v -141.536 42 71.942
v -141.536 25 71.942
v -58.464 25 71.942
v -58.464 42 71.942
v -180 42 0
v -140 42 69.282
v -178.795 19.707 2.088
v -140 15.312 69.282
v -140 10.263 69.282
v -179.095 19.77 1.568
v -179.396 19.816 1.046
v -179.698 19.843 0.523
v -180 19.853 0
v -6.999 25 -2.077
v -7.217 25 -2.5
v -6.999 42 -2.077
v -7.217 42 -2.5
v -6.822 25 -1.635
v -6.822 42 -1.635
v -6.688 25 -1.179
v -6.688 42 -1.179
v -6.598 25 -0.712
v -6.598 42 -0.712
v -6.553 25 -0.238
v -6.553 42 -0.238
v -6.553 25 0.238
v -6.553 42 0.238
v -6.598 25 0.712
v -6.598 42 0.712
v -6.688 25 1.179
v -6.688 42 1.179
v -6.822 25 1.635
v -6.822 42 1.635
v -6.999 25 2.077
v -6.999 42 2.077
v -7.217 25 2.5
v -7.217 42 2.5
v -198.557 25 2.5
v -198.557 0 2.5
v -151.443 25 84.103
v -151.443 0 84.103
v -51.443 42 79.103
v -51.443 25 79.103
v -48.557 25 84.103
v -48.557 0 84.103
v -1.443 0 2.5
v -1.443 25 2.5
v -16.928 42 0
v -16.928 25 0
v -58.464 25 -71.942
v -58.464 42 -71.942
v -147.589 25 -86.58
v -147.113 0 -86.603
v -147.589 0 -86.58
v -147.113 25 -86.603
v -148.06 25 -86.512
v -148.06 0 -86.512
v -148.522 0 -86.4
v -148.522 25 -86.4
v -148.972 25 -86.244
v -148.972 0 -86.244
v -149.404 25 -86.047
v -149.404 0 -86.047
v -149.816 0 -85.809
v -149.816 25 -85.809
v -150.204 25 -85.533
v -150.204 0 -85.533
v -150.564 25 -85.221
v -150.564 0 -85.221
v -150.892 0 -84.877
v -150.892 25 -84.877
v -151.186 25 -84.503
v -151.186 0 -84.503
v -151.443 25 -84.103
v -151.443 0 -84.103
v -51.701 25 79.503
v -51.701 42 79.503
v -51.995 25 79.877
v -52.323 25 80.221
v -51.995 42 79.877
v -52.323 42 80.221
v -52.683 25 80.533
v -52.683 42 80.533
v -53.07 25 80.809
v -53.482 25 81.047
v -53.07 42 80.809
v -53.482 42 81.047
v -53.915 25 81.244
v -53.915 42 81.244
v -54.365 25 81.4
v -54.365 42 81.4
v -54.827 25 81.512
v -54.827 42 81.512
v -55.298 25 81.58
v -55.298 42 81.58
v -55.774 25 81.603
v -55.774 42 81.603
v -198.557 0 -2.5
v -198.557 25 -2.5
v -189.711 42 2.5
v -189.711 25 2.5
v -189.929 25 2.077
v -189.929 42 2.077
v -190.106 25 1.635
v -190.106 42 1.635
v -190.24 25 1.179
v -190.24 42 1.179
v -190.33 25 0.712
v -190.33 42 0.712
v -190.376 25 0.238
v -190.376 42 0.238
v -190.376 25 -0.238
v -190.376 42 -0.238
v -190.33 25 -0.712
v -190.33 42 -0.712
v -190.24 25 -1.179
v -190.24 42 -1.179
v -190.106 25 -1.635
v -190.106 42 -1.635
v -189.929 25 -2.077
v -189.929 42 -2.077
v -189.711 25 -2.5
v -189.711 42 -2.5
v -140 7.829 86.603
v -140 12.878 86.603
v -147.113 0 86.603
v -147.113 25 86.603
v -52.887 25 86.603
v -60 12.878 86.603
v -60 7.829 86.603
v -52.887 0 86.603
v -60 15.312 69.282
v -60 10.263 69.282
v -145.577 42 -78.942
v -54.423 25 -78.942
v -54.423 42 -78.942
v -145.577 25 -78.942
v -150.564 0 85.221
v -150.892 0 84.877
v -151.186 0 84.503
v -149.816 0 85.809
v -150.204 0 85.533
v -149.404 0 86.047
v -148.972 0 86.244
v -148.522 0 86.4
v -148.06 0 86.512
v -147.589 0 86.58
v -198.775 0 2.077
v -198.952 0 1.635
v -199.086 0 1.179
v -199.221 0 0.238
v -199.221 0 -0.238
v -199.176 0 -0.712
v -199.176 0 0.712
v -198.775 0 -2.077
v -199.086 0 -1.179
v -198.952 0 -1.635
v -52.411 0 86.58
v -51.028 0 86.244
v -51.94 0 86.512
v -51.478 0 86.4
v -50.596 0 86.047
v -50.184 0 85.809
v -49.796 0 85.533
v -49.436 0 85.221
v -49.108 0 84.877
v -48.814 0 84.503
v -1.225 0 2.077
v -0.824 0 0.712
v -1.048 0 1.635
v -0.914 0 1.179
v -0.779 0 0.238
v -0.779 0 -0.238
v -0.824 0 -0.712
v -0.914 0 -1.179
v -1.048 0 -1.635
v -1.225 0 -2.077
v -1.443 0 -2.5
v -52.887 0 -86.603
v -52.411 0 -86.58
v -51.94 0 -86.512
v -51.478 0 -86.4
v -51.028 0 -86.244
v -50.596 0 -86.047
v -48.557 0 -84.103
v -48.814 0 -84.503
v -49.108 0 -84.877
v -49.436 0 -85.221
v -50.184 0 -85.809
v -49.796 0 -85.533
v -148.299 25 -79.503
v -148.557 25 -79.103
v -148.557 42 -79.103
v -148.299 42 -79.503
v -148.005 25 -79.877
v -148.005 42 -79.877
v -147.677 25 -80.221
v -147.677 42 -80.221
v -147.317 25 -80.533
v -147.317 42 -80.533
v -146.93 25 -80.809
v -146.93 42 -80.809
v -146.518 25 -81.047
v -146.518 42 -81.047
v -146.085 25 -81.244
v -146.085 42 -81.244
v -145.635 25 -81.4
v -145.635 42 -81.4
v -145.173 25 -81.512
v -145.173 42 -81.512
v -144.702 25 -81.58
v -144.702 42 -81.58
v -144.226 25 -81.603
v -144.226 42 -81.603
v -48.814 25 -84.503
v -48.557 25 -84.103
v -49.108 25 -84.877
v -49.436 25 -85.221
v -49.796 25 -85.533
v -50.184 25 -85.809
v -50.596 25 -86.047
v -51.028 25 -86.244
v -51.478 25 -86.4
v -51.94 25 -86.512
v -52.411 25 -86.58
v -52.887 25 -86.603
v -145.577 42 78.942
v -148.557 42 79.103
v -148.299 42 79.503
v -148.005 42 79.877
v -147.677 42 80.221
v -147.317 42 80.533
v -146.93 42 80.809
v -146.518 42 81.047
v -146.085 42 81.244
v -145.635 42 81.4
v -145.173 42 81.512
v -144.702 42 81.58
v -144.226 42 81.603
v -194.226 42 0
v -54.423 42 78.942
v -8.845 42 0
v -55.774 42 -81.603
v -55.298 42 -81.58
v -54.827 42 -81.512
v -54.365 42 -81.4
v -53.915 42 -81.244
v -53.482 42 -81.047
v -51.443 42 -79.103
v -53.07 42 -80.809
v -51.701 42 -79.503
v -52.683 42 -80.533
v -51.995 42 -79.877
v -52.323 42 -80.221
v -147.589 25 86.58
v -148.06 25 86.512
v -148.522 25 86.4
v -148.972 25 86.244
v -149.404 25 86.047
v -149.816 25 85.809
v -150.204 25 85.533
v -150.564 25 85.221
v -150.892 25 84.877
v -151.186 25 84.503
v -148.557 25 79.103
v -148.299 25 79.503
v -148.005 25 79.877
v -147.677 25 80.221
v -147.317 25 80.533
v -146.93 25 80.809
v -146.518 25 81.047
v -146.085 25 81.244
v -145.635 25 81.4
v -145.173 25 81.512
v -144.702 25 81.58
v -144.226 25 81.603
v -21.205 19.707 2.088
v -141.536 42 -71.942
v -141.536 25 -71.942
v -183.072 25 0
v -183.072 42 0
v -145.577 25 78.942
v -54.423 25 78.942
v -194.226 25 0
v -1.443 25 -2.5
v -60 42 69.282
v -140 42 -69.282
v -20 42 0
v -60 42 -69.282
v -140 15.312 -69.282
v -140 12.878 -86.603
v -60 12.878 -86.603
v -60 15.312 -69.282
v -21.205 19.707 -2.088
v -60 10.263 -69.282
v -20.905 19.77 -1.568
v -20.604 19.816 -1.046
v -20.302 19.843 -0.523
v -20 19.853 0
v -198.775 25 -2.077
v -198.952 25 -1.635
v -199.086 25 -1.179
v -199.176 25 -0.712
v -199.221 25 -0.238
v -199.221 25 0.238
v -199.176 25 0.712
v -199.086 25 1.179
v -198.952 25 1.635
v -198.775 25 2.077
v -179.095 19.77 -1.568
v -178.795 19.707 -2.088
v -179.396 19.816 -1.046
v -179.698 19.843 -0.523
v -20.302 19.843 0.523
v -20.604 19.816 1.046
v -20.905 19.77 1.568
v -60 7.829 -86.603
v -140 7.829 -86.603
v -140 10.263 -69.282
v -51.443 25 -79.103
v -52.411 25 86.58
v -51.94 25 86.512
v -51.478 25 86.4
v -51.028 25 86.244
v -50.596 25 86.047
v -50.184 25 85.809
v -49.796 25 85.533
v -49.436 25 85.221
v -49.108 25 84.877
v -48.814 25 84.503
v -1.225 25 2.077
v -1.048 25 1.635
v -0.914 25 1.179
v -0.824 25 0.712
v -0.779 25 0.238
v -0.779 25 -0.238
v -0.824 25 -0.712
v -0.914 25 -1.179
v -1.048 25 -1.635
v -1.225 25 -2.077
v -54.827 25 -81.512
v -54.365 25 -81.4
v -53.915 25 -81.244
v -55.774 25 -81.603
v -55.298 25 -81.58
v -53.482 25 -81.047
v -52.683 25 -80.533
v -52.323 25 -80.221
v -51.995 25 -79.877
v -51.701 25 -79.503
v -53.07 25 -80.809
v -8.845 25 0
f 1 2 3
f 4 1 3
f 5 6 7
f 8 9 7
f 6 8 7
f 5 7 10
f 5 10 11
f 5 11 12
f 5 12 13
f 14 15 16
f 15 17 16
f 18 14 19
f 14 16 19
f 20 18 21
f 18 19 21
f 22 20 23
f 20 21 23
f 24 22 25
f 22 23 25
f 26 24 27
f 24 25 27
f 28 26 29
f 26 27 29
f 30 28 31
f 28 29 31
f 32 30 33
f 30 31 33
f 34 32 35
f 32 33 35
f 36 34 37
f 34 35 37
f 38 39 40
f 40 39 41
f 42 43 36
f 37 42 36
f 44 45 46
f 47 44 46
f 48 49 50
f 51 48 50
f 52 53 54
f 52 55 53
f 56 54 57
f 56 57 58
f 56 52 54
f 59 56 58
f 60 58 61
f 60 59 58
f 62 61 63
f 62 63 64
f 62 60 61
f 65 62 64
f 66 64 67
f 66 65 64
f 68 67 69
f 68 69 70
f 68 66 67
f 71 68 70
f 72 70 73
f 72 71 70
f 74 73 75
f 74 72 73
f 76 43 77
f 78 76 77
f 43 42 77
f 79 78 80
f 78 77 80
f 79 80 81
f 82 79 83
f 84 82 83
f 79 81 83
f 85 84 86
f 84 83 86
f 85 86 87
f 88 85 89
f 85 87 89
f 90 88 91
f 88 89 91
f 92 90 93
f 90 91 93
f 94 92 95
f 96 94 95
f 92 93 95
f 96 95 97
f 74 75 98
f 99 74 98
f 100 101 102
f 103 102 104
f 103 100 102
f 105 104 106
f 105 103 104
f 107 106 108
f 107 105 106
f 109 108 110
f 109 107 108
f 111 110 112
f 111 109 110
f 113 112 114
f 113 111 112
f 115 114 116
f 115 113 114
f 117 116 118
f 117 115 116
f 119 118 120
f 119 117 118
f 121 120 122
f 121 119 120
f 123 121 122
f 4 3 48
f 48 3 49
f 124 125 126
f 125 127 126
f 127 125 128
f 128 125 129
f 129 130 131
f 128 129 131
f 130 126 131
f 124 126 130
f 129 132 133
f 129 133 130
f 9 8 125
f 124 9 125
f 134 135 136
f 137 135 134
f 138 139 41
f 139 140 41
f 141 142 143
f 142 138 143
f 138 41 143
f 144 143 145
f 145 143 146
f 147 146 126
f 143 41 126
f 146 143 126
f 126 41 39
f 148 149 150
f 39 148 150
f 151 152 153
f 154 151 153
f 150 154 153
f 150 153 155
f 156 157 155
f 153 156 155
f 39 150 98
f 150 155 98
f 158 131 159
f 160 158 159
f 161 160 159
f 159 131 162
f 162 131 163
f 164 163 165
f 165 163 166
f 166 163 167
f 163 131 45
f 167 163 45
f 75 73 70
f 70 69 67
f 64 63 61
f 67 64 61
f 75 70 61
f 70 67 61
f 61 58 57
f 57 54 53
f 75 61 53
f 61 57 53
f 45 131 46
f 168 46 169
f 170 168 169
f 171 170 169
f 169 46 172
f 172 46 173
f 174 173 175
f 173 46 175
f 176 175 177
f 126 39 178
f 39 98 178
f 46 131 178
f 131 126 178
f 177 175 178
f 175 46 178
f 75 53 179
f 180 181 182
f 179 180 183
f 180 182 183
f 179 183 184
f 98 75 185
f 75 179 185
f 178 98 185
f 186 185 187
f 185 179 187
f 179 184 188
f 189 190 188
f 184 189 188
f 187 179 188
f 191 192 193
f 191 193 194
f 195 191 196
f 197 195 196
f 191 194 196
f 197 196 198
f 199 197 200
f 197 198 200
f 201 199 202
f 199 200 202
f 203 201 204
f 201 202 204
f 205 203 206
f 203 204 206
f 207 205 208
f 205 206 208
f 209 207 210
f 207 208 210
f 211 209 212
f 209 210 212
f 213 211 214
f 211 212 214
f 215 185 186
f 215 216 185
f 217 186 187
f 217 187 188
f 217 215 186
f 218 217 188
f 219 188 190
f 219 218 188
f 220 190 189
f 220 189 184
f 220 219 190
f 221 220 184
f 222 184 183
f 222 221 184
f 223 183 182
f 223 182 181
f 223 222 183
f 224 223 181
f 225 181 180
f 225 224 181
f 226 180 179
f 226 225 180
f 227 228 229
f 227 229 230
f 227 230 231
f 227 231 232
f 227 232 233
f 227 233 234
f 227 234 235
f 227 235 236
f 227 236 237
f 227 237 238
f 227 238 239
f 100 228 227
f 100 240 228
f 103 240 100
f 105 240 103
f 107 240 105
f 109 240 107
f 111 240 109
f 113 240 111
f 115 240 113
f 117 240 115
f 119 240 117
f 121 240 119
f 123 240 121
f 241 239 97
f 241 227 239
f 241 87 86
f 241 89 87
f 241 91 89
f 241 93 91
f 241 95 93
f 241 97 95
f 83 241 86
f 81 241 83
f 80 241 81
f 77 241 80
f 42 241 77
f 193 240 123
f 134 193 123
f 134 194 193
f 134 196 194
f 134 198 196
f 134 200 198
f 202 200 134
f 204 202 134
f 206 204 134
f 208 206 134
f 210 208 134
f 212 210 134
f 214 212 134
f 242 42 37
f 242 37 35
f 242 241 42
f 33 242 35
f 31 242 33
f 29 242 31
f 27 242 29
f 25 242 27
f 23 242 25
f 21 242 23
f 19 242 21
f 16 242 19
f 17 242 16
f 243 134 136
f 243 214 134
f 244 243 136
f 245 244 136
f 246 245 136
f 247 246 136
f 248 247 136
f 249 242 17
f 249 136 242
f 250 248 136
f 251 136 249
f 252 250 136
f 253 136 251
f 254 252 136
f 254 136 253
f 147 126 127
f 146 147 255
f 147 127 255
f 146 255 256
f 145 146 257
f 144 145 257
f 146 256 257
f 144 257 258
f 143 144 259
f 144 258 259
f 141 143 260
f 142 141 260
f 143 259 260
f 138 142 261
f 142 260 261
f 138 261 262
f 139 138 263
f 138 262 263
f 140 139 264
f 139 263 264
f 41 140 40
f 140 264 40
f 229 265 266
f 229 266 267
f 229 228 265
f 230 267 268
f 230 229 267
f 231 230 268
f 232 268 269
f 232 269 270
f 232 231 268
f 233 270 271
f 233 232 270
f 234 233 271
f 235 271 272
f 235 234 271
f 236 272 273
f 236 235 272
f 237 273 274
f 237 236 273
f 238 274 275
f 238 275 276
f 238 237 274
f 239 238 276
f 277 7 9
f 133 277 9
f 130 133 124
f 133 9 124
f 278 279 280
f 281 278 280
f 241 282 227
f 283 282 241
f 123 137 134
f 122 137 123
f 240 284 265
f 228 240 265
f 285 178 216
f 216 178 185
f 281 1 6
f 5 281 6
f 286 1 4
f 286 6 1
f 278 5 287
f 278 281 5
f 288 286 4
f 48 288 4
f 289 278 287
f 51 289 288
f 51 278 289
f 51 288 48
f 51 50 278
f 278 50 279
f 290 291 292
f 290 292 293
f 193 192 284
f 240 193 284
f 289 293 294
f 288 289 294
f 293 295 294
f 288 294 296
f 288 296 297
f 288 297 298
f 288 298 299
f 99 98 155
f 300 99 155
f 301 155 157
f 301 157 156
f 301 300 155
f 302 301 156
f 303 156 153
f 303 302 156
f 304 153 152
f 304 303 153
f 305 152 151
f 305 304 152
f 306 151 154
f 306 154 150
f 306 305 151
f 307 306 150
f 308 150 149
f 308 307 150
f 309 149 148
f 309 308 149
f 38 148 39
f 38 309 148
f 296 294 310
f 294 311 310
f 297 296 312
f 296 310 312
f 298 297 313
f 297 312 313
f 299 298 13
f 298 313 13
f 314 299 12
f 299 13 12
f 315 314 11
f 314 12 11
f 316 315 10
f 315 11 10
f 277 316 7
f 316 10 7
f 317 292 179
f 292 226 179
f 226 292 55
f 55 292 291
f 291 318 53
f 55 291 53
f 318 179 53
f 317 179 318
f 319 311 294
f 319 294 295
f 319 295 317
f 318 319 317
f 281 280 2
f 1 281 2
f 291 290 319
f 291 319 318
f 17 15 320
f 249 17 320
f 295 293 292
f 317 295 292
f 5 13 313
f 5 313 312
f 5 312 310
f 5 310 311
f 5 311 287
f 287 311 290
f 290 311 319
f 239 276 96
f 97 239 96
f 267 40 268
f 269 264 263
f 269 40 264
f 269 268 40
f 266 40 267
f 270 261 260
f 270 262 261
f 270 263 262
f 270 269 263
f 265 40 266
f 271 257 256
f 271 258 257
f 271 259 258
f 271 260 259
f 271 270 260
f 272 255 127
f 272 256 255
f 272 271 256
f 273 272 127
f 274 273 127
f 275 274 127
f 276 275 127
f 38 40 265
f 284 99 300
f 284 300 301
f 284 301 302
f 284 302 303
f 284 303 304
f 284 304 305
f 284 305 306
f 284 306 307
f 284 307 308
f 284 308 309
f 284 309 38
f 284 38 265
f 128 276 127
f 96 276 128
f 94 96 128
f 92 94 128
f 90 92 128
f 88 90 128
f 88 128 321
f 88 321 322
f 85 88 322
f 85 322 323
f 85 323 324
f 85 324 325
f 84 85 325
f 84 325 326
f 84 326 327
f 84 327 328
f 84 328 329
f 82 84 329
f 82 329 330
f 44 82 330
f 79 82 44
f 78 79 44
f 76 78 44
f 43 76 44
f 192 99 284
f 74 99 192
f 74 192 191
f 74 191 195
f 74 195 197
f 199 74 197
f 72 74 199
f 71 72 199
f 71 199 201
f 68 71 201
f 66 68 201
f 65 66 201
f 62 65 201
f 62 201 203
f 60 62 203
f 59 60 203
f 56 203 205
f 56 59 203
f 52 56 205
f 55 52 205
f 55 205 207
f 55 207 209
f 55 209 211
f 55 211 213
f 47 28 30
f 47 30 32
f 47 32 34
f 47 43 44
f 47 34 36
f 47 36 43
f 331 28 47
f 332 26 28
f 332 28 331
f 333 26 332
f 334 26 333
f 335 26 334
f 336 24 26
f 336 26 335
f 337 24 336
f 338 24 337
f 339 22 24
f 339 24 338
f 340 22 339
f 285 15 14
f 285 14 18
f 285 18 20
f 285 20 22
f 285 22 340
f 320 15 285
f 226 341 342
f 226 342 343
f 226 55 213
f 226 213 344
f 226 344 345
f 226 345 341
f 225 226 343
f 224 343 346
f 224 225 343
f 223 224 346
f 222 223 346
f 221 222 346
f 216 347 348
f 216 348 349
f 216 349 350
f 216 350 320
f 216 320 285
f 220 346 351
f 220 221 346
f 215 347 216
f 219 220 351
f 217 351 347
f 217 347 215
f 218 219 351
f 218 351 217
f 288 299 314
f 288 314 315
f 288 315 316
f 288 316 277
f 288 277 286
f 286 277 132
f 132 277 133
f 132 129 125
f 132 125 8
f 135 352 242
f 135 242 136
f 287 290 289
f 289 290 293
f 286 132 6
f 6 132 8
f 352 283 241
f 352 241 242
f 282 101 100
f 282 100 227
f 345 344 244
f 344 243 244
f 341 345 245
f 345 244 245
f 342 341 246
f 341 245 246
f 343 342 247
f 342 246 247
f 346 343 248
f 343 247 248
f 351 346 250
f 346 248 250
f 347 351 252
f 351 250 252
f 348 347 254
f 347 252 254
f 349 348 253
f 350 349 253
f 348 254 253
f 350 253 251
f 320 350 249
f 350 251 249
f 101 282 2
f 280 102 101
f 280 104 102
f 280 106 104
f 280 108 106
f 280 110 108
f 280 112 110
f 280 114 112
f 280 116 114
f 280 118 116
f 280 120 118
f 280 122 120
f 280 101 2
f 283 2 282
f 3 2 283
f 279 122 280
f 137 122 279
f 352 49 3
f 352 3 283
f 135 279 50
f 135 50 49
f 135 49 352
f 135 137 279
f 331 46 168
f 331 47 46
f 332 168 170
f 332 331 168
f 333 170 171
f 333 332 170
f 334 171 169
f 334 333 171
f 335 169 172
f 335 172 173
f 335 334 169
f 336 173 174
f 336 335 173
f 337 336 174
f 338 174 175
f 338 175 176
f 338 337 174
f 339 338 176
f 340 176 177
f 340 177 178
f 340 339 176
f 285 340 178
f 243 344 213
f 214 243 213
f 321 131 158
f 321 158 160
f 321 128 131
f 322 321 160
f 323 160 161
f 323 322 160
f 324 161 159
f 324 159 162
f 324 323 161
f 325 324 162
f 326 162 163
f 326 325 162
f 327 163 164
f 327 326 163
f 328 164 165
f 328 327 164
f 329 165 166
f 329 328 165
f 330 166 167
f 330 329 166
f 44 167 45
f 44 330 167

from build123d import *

# Parameters (mm, degrees)
BOSS_EXTRUDE1_DEPTH            = 25
CUT_EXTRUDE1_DEPTH             = 5
CUT_EXTRUDE7_REACH             = 136.629
CUT_EXTRUDE7_DIRECTION_2_REACH = 136.629
CUT_EXTRUDE8_REACH             = 136.629
CUT_EXTRUDE8_DIRECTION_2_REACH = 136.629
CUT_EXTRUDE9_DEPTH             = 40
CUT_EXTRUDE9_DEPTH_BACK        = 40
FILLET2_R                      = 15
BOSS_EXTRUDE5_DEPTH            = 17
FILLET3_R                      = 5


with BuildPart() as part:
    # Sketch1 → Boss-Extrude1 (new body)
    with BuildSketch(Plane(origin=(0, 0, 0), x_dir=(1, 0, 0), z_dir=(0, 1, 0))):
        Polygon((0, 0), (-50, 86.6025403784439), (-149.99999999999997, 86.60254037844393), (-199.99999999999997, 1.041e-14), (-150.00000000000003, -86.60254037844386), (-50.00000000000001, -86.60254037844389), align=None)
    extrude(amount=BOSS_EXTRUDE1_DEPTH)

    # Sketch6 → Cut-Extrude1 (cut)
    with BuildSketch(Plane(origin=(0, 25, 0), x_dir=(1, 0, 0), z_dir=(0, 1, 0))):
        Polygon((-180, 5.476e-14), (-139.99999999999997, -69.28203230275507), (-59.99999999999997, -69.28203230275508), (-20.000000000000004, 1.463e-14), (-60.000000000000014, 69.28203230275516), (-140, 69.28203230275516), align=None)
    extrude(amount=-CUT_EXTRUDE1_DEPTH, mode=Mode.SUBTRACT)

    # Cut-Extrude7: up to this plane
    cut_extrude7_end = Plane(origin=(-20.000000000000004, 20, -1.463e-14), z_dir=(0.8660254037844388, 0, -0.49999999999999983))
    # Sketch21 → Cut-Extrude7 (cut, up to the surface)
    with BuildSketch(Plane(origin=(-100, 0, 0), x_dir=(0, 0, -1), z_dir=(1, 0, 0)), mode=Mode.PRIVATE) as cut_extrude7_sk1:
        Polygon((69.28203230275516, 20), (69.28203230275516, 10.263045350293245), (3.123e-14, 20), align=None)
    cut_extrude7_tool1 = split(extrude(cut_extrude7_sk1.sketch, amount=CUT_EXTRUDE7_REACH, mode=Mode.PRIVATE), bisect_by=cut_extrude7_end, keep=Keep.BOTH, mode=Mode.PRIVATE)
    add(cut_extrude7_tool1.solids().sort_by_distance((-100, 16.754348, -46.188022))[0], mode=Mode.SUBTRACT)

    # Cut-Extrude7 direction 2: up to this plane
    cut_extrude7_direction_2_end = Plane(origin=(-140, 20, -69.28203230275516), z_dir=(-0.8660254037844388, 0, -0.4999999999999998))
    # Sketch21 → Cut-Extrude7 direction 2 (cut, up to the surface)
    with BuildSketch(Plane(origin=(-100, 0, 0), x_dir=(0, 0, -1), z_dir=(1, 0, 0)), mode=Mode.PRIVATE) as cut_extrude7_direction_2_sk1:
        Polygon((69.28203230275516, 20), (69.28203230275516, 10.263045350293245), (3.123e-14, 20), align=None)
    cut_extrude7_direction_2_tool1 = split(extrude(cut_extrude7_direction_2_sk1.sketch, amount=-CUT_EXTRUDE7_DIRECTION_2_REACH, mode=Mode.PRIVATE), bisect_by=cut_extrude7_direction_2_end, keep=Keep.BOTH, mode=Mode.PRIVATE)
    add(cut_extrude7_direction_2_tool1.solids().sort_by_distance((-100, 16.754348, -46.188022))[0], mode=Mode.SUBTRACT)

    # Cut-Extrude8: up to this plane
    cut_extrude8_end = Plane(origin=(-59.99999999999997, 20, 69.28203230275508), z_dir=(0.8660254037844388, 0, 0.49999999999999967))
    # Sketch22 → Cut-Extrude8 (cut, up to the surface)
    with BuildSketch(Plane(origin=(-100, 0, 0), x_dir=(0, 0, -1), z_dir=(1, 0, 0)), mode=Mode.PRIVATE) as cut_extrude8_sk1:
        Polygon((3.123e-14, 20), (-69.28203230275508, 10.26304535029323), (-69.28203230275508, 20), align=None)
    cut_extrude8_tool1 = split(extrude(cut_extrude8_sk1.sketch, amount=CUT_EXTRUDE8_REACH, mode=Mode.PRIVATE), bisect_by=cut_extrude8_end, keep=Keep.BOTH, mode=Mode.PRIVATE)
    add(cut_extrude8_tool1.solids().sort_by_distance((-100, 16.754348, 46.188022))[0], mode=Mode.SUBTRACT)

    # Cut-Extrude8 direction 2: up to this plane
    cut_extrude8_direction_2_end = Plane(origin=(-180, 20, -5.476e-14), z_dir=(-0.8660254037844387, 0, 0.5))
    # Sketch22 → Cut-Extrude8 direction 2 (cut, up to the surface)
    with BuildSketch(Plane(origin=(-100, 0, 0), x_dir=(0, 0, -1), z_dir=(1, 0, 0)), mode=Mode.PRIVATE) as cut_extrude8_direction_2_sk1:
        Polygon((3.123e-14, 20), (-69.28203230275508, 10.26304535029323), (-69.28203230275508, 20), align=None)
    cut_extrude8_direction_2_tool1 = split(extrude(cut_extrude8_direction_2_sk1.sketch, amount=-CUT_EXTRUDE8_DIRECTION_2_REACH, mode=Mode.PRIVATE), bisect_by=cut_extrude8_direction_2_end, keep=Keep.BOTH, mode=Mode.PRIVATE)
    add(cut_extrude8_direction_2_tool1.solids().sort_by_distance((-100, 16.754348, 46.188022))[0], mode=Mode.SUBTRACT)

    # Sketch23 → Cut-Extrude9 (cut, two sides: drawn at the far end of the back side and taken through both)
    with BuildSketch(Plane(origin=(-100, 0, 0), x_dir=(0, 0, -1), z_dir=(1, 0, 0)).offset(-CUT_EXTRUDE9_DEPTH_BACK)):
        Polygon((69.28203230275516, 10.263045350293245), (89.28203230275517, 7.452228656245558), (89.28203230275517, 12.501366518838644), (69.28203230275516, 15.312183212886326), align=None)
        Polygon((-69.28203230275516, 15.312183212886326), (-69.28203230275516, 10.263045350293245), (-89.28203230275517, 7.452228656245558), (-89.28203230275517, 12.501366518838644), align=None)
    extrude(amount=CUT_EXTRUDE9_DEPTH + CUT_EXTRUDE9_DEPTH_BACK, mode=Mode.SUBTRACT)

    # Fillet2
    fillet2_edges = [part.edges().sort_by_distance(p)[0] for p in [
        (-100, 20, -3.347e-14),
    ]]
    fillet(fillet2_edges, radius=FILLET2_R)

    # Sketch27 → Boss-Extrude5 (add)
    # profile 1 of 2: a face of its own
    with BuildSketch(Plane(origin=(0, 25, 0), x_dir=(1, 0, 0), z_dir=(0, 1, 0))):
        Polygon((-147.1132486552964, -81.60254038059946), (-52.8867513447036, -81.60254038059949), (-5.773502689407191, -2.776e-14), (-52.88675134470361, 81.60254038059944), (-147.1132486552964, 81.60254038059945), (-194.22649731059275, -2.775e-14), align=None)
        Polygon((-54.42264973081038, -78.94228634059947), (-8.845299461620776, -2.374e-14), (-54.4226497308104, 78.9422863405995), (-145.57735026918957, 78.9422863405995), (-191.1547005383792, -1.365e-14), (-145.57735026918962, -78.94228634059945), align=None, mode=Mode.SUBTRACT)
    # profile 2 of 2: a face of its own
    with BuildSketch(Plane(origin=(0, 25, 0), x_dir=(1, 0, 0), z_dir=(0, 1, 0))):
        Polygon((-141.5358983848622, -71.94228634059951), (-58.46410161513772, -71.94228634059952), (-16.92820323027549, 1.392e-14), (-58.4641016151377, 71.94228634059947), (-141.53589838486224, 71.94228634059947), (-183.0717967697245, -2.773e-14), align=None)
        Polygon((-139.99999999999997, -69.28203230275507), (-180, 6.939e-14), (-140, 69.28203230275516), (-60.000000000000014, 69.28203230275516), (-20.000000000000004, 1.463e-14), (-59.99999999999997, -69.28203230275508), align=None, mode=Mode.SUBTRACT)
    extrude(amount=BOSS_EXTRUDE5_DEPTH)

    # Fillet3
    fillet3_edges = [part.edges().sort_by_distance(p)[0] for p in [
        (-50.00000000000001, 12.5, 86.60254037844389),
        (-150.00000000000003, 12.5, 86.60254037844386),
        (-147.1132486552964, 33.5, 81.60254038059946),
        (-199.99999999999997, 12.5, -1.041e-14),
        (-52.8867513447036, 33.5, 81.60254038059949),
        (-5.773502689407191, 33.5, 2.776e-14),
        (-149.99999999999997, 12.5, -86.60254037844393),
        (-52.88675134470361, 33.5, -81.60254038059944),
        (-147.1132486552964, 33.5, -81.60254038059945),
        (-50, 12.5, -86.6025403784439),
        (0, 12.5, 0),
        (-191.1547005383792, 33.5, 1.365e-14),
    ]]
    fillet(fillet3_edges, radius=FILLET3_R)


solid = part.part
